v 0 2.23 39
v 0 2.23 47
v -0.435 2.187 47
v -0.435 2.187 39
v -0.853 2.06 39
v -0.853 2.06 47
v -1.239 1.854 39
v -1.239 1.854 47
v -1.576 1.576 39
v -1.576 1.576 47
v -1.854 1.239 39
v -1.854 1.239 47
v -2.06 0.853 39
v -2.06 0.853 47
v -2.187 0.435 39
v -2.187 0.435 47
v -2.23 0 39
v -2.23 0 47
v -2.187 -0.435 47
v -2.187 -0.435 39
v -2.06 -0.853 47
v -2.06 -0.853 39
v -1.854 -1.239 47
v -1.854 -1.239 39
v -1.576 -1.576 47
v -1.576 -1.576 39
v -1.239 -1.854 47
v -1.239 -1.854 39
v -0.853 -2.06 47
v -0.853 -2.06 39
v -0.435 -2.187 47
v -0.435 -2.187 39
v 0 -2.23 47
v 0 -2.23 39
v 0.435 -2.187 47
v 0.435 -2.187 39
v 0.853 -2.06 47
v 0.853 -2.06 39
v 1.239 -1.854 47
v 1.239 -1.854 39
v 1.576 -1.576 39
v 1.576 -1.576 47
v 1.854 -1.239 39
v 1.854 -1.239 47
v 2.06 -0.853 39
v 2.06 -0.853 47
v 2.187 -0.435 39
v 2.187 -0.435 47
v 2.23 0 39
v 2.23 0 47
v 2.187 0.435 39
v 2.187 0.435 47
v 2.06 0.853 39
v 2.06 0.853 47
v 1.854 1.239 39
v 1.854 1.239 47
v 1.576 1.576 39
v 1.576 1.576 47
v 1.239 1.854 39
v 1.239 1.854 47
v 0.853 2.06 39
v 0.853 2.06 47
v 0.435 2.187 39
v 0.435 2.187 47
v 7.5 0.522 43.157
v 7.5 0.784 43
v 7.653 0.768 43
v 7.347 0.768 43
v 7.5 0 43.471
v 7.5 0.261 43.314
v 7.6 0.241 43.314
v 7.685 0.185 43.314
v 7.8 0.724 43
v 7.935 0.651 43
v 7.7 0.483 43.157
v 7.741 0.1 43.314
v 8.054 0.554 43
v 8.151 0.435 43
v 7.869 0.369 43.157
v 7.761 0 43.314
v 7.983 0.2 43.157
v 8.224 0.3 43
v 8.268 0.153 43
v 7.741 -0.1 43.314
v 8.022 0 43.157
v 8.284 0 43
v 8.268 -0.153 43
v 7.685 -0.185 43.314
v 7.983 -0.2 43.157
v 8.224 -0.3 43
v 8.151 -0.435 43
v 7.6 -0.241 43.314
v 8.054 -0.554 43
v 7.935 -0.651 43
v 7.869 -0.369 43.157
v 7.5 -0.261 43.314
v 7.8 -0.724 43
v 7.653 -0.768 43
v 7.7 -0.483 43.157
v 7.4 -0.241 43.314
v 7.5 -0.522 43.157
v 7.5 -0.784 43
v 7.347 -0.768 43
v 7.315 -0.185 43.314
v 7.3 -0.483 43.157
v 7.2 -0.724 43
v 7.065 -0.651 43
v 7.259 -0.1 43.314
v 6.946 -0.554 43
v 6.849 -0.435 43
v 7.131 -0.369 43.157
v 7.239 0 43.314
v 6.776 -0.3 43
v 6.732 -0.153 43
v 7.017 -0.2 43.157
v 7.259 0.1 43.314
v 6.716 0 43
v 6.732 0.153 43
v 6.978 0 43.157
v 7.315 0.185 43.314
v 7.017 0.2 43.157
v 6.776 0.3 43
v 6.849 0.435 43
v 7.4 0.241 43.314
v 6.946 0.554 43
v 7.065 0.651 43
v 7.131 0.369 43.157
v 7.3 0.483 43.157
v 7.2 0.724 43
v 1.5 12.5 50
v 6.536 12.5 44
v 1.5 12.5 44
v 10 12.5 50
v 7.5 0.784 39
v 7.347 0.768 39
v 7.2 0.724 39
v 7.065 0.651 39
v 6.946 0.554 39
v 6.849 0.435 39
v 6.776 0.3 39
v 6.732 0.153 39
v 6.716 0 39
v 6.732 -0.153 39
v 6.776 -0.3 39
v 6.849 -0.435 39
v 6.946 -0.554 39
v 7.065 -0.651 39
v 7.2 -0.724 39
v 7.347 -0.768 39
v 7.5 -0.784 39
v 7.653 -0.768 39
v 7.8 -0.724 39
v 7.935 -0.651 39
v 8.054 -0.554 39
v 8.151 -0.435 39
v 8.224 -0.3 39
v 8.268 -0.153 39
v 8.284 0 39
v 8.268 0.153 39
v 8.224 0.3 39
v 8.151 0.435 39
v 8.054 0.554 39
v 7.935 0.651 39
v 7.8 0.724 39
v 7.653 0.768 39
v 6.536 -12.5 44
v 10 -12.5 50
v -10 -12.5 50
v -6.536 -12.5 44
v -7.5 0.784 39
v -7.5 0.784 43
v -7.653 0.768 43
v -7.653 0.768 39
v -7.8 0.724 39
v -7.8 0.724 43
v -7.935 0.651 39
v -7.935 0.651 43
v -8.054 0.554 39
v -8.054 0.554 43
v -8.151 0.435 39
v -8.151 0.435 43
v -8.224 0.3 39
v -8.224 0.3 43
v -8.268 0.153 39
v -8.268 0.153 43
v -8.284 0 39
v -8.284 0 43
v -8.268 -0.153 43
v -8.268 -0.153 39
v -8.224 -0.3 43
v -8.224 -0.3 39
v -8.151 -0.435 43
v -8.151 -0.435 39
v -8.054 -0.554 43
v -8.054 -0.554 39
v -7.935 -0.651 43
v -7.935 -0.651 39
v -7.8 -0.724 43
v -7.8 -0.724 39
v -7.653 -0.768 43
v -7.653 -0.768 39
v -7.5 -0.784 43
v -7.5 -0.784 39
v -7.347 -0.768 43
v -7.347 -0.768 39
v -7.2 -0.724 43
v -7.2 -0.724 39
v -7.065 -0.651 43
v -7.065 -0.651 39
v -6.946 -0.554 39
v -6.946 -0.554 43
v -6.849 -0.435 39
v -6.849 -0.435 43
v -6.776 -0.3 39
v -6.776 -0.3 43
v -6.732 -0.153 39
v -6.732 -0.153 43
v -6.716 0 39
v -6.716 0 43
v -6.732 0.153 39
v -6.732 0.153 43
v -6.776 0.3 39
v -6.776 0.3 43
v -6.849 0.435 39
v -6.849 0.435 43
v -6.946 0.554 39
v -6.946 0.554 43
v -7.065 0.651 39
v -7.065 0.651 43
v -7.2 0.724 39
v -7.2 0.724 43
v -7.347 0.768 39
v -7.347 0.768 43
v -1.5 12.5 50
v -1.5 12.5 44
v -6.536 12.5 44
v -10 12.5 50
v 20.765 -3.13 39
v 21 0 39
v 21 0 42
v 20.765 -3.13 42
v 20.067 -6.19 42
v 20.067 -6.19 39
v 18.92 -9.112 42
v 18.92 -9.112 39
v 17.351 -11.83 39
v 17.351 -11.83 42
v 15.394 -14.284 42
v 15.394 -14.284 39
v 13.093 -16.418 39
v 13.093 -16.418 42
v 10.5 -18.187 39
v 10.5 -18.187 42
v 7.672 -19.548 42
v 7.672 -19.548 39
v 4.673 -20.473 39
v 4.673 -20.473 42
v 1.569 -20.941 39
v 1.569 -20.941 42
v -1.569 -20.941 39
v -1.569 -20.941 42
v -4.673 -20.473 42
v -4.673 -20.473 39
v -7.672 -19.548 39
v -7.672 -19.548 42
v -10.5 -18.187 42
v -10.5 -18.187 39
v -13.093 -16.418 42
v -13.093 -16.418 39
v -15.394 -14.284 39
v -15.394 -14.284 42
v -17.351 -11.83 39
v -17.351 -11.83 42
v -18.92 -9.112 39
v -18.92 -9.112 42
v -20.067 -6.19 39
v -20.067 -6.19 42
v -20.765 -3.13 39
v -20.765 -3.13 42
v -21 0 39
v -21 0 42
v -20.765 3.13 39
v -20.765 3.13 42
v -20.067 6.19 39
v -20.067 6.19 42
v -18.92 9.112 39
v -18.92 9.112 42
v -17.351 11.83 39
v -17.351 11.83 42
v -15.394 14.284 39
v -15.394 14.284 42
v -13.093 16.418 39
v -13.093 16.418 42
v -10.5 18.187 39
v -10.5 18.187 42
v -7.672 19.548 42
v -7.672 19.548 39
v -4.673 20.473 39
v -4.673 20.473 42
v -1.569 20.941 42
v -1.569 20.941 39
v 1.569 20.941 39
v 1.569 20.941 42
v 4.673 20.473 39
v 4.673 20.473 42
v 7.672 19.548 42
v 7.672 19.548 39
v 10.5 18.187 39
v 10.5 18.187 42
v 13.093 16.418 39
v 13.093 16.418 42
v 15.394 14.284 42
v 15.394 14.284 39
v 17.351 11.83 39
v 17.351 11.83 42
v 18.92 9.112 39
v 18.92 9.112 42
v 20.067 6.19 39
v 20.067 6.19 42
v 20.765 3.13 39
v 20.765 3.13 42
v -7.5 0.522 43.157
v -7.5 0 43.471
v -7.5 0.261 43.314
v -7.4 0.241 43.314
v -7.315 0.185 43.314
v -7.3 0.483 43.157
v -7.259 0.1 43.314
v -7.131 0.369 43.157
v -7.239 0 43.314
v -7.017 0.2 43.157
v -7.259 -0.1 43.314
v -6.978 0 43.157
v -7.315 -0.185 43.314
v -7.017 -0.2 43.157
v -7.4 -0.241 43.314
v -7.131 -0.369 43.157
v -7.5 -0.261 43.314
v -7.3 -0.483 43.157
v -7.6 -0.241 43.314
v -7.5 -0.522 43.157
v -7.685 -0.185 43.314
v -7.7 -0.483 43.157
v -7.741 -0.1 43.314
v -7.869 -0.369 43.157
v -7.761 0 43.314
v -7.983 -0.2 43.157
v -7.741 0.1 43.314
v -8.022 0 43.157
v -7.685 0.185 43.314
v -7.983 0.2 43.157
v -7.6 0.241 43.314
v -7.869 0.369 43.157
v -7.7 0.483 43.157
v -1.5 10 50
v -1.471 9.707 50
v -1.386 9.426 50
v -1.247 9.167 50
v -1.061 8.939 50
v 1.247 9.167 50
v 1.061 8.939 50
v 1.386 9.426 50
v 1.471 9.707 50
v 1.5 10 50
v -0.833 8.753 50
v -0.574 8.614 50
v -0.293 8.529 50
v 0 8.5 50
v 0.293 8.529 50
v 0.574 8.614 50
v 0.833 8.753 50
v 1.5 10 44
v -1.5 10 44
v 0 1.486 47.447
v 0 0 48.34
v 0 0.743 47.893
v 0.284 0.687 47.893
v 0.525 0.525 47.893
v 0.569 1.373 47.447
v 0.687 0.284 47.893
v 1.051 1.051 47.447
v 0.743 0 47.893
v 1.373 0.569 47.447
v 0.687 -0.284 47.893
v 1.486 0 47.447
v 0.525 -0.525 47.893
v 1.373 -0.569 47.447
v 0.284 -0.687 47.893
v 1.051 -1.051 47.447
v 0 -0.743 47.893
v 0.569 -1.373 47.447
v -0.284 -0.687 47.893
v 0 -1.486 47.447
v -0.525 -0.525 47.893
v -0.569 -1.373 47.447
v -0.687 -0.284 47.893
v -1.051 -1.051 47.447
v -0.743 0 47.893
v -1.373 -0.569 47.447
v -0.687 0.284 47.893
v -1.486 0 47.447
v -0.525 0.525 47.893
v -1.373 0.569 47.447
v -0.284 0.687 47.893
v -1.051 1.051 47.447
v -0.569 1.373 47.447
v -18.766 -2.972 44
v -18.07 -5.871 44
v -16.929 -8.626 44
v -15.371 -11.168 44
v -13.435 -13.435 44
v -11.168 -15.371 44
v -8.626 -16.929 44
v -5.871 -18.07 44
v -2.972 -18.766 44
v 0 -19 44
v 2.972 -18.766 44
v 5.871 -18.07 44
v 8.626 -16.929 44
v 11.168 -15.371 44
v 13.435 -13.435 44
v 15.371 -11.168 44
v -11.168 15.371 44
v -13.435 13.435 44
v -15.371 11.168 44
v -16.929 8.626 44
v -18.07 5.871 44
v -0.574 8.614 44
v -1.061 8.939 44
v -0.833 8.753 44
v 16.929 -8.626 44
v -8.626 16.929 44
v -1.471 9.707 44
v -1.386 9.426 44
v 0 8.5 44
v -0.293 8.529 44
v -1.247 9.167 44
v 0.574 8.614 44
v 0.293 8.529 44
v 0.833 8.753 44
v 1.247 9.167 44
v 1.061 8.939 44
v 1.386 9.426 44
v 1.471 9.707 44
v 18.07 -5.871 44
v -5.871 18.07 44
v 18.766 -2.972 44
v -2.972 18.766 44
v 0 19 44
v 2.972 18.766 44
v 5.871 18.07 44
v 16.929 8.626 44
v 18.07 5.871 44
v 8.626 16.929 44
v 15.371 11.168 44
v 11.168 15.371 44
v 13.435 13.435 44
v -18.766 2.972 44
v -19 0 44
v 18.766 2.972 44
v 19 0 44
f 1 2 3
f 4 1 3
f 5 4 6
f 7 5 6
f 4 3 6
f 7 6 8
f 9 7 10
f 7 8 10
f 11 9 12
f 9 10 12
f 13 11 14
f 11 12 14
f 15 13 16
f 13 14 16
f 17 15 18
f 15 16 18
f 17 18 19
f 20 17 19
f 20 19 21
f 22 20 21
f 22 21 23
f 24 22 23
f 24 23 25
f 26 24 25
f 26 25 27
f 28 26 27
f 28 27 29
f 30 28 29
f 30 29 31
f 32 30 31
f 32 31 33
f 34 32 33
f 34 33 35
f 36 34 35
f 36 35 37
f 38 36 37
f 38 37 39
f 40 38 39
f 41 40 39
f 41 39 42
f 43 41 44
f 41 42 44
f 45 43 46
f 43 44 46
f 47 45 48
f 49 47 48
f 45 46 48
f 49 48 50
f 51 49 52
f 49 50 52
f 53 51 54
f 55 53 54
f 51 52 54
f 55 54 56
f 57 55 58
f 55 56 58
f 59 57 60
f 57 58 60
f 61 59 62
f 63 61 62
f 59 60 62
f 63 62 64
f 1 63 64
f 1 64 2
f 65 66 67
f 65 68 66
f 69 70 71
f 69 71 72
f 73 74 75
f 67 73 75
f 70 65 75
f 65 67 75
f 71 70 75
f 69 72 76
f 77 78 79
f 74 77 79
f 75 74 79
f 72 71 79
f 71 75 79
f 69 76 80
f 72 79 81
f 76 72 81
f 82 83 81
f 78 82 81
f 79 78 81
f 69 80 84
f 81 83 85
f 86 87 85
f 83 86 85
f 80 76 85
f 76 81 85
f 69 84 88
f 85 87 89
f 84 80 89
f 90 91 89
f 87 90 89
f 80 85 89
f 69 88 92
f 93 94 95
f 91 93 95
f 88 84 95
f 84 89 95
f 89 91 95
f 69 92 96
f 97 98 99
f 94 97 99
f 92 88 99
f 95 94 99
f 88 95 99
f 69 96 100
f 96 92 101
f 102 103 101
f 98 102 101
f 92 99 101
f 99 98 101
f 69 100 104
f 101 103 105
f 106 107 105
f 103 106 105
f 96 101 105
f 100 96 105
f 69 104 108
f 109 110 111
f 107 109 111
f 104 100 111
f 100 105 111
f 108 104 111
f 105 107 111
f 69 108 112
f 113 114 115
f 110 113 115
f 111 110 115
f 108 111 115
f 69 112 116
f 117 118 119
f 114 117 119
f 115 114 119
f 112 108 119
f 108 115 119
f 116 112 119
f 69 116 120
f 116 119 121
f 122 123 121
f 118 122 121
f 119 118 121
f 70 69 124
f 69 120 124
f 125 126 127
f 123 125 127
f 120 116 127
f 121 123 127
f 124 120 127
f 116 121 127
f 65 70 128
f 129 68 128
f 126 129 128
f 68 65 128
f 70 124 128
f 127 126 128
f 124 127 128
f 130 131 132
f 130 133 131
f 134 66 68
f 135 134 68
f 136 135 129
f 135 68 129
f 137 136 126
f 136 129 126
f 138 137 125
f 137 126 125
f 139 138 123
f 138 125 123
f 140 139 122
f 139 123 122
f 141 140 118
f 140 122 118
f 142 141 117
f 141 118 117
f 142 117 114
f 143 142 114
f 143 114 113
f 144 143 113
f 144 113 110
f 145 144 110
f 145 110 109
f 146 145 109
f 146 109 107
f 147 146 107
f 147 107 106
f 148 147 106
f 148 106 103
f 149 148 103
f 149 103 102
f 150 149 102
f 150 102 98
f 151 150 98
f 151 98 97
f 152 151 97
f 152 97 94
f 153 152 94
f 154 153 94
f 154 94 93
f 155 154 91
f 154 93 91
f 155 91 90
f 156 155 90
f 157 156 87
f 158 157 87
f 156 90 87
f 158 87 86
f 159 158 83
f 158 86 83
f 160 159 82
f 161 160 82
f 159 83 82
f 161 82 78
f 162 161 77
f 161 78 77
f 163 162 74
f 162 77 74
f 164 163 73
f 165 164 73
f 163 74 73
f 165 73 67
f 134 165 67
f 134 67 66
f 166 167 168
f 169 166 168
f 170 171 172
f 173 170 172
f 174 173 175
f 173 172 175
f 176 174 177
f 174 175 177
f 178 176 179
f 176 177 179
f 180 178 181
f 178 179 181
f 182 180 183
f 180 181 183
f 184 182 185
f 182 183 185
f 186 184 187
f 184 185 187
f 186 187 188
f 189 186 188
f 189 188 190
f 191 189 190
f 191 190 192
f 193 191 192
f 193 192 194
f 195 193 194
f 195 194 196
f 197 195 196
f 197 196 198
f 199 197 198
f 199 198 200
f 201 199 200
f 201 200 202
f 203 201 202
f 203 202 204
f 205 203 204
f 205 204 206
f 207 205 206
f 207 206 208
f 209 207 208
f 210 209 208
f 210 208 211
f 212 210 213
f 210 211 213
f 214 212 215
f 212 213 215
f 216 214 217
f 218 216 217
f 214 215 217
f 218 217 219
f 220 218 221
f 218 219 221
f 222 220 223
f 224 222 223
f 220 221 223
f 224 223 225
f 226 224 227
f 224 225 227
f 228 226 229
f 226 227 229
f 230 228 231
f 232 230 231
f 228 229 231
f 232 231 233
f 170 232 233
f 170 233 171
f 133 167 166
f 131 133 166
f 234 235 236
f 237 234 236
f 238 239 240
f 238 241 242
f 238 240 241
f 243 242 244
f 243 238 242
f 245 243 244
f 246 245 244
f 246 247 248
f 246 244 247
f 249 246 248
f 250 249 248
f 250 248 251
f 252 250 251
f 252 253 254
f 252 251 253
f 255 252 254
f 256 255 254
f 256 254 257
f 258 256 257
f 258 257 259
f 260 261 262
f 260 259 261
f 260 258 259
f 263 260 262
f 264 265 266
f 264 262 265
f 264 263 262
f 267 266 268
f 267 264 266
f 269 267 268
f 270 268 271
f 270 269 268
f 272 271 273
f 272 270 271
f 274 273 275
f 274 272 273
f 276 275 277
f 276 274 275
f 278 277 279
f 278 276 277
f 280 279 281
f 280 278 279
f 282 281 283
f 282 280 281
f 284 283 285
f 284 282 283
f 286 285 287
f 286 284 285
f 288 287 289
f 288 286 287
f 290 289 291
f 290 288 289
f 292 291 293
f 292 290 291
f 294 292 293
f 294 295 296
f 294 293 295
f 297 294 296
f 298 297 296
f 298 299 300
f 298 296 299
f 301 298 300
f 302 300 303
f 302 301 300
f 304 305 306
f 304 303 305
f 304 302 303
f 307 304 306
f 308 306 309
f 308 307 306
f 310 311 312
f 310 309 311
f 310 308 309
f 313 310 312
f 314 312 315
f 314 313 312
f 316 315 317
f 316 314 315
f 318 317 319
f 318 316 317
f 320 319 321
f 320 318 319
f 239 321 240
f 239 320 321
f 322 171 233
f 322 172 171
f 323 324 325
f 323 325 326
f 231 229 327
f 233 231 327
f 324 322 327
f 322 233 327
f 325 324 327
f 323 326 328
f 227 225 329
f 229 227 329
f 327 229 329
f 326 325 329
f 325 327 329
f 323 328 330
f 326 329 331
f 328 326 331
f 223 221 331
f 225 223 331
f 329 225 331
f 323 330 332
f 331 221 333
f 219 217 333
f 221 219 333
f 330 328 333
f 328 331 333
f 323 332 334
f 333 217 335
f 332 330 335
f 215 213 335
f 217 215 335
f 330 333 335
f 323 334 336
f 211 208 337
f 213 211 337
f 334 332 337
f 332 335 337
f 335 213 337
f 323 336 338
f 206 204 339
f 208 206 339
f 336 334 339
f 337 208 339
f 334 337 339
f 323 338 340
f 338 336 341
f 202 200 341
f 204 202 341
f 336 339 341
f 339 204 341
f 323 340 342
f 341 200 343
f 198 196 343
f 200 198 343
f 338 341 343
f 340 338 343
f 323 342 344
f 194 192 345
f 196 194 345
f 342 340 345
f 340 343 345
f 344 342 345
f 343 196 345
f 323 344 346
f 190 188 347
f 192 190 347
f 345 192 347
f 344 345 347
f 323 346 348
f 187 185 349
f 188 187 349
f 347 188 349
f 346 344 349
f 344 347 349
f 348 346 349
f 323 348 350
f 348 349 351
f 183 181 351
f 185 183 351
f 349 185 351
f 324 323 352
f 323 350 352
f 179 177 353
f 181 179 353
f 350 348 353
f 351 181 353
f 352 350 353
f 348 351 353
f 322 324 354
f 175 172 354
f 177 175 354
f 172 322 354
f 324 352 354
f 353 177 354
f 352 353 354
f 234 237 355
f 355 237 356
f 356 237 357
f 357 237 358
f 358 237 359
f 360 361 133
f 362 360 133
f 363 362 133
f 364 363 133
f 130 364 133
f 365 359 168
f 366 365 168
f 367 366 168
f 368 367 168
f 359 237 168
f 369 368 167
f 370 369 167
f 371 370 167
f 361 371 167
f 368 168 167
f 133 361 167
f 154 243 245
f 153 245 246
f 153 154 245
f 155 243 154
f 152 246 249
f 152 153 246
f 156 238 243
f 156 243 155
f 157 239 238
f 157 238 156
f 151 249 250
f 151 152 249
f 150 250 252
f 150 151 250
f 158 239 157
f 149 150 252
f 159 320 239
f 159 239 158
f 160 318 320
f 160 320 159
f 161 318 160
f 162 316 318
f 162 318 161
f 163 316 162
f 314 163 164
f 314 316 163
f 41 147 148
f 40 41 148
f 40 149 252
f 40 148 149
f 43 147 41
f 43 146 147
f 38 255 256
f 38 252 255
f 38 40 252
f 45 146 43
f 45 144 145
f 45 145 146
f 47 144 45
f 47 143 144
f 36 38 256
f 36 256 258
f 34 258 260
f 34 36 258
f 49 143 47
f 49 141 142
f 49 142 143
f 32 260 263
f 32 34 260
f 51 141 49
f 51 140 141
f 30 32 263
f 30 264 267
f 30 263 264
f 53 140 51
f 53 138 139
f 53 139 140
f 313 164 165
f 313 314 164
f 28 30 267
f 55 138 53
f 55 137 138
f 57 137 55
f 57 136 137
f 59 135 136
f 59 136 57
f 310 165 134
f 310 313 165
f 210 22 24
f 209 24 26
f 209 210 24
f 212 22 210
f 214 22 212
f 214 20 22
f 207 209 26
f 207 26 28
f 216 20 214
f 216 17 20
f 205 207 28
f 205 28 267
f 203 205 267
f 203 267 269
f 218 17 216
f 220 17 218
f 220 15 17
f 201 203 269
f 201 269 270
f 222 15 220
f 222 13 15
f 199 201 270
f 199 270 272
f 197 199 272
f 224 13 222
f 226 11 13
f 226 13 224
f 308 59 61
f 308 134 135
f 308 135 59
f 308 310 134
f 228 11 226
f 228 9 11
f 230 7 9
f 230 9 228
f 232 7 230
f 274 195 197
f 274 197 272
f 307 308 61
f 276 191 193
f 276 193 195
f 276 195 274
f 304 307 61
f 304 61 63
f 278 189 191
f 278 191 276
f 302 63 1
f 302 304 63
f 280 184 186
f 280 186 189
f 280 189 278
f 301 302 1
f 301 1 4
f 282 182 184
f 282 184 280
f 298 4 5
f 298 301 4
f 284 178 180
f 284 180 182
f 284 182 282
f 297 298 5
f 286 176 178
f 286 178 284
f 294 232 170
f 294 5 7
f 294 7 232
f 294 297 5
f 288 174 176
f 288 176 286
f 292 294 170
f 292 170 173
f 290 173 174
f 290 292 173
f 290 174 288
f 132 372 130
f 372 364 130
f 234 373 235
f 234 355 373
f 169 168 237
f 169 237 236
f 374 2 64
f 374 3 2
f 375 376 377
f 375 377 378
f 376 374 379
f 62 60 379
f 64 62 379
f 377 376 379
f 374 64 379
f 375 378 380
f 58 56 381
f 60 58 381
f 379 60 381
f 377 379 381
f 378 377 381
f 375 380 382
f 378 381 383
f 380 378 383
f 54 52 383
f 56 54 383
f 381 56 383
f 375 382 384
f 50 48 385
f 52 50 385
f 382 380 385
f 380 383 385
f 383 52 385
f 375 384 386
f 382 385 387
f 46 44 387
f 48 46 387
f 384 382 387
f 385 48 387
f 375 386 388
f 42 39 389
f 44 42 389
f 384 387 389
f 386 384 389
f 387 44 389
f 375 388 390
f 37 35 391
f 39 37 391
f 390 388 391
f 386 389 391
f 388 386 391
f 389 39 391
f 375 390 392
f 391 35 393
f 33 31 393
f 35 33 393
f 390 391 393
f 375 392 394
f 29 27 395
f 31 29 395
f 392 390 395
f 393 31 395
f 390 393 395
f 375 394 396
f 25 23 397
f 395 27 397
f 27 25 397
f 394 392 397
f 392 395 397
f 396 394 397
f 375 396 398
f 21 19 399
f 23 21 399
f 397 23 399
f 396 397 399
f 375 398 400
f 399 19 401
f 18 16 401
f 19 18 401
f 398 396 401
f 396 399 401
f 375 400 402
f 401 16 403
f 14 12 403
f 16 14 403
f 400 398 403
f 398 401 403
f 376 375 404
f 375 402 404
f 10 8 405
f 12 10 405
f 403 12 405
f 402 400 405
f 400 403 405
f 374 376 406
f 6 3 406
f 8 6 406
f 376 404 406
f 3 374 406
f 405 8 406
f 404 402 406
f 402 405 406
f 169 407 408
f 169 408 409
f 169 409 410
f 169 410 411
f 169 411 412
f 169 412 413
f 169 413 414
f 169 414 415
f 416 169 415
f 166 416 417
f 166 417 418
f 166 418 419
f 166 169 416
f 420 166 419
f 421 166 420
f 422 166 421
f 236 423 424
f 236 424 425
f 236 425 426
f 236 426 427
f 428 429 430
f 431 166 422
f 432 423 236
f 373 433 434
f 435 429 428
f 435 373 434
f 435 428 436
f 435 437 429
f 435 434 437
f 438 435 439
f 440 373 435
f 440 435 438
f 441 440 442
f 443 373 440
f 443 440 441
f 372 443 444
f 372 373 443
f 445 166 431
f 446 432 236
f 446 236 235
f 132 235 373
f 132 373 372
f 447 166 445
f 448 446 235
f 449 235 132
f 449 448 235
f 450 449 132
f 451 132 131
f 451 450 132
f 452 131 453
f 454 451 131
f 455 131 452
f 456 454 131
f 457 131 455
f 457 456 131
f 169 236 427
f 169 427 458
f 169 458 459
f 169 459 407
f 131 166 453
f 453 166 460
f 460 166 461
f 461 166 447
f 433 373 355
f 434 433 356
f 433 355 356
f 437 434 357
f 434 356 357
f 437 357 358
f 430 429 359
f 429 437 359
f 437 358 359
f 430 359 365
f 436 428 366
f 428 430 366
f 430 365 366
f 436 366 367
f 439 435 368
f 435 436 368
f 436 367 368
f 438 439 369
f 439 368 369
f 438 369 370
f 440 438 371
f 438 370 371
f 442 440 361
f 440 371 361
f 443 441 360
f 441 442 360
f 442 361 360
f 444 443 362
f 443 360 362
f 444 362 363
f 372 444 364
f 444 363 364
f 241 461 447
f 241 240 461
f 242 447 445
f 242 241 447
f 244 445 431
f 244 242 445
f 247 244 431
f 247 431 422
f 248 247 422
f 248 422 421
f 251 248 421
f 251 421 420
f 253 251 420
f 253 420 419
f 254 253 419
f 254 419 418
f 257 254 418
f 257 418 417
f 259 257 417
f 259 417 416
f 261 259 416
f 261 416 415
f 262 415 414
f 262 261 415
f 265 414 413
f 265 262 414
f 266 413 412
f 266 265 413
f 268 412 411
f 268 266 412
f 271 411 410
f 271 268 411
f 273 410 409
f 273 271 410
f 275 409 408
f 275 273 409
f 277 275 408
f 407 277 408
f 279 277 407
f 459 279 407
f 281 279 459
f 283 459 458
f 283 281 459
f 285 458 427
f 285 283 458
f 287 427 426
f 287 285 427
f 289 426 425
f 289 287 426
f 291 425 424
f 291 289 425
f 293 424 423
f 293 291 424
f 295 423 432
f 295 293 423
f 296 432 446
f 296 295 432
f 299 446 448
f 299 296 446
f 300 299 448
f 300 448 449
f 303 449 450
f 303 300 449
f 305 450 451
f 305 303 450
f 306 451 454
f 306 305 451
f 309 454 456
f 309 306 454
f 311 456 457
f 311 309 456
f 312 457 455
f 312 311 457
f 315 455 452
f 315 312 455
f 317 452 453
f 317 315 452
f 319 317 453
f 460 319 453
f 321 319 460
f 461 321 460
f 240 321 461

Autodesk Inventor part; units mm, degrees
ref_plane "YZ Plane" through (0, 0, 0) normal (1, 0, 0) x (0, 1, 0)
ref_plane "XY Plane" through (0, 0, 0) normal (0, 0, 1) x (1, 0, 0)
sketch "Skizze1" plane through (0, 0, 0) normal (0, 0, 1) x (1, 0, 0)
  line L0 (-29.4, 0) -> (29.4, 0) projected
  line L1 (0, -29.4) -> (0, 29.4) projected
  circle A0 centre (0, 0) radius 21
  circle A1 centre (0, 0) radius 19.5
  dimension "d0" = 42
  dimension "d1" = 39
extrude "Extrusion1" add sketch "Skizze1" along normal blind 40 contours A1 L1 A0 L0 | L0 A0 L1 A1 | A1 L0 A0 L1 | L1 A0 L0 A1
sketch "Skizze2" plane through (0, 0, 40) normal (0, 0, 1) x (1, 0, 0)
  circle A0 centre (0, 0) radius 19.5 projected
extrude "Extrusion2" add sketch "Skizze2" against normal blind 1
sketch "Skizze3" plane through (0, 0, 40) normal (0, 0, 1) x (1, 0, 0)
  circle A0 centre (0, 0) radius 21 projected
extrude "Extrusion3" add sketch "Skizze3" along normal blind 4
sketch "Skizze4" plane through (0, 0, 0) normal (0, 1, 0) x (-1, 0, 0)
  line L0 (21, 44) -> (-21, 44) projected
  line L1 (10, 50) -> (-10, 50)
  line L2 (0, -9.2) -> (0, 55.2) projected
  line L3 (29.4, 0) -> (-29.4, 0) projected
  line L4 (-10, 50) -> (-6.5359, 44)
  line L5 (10, 50) -> (6.5359, 44)
  line L6 (-6.5359, 44) -> (6.5359, 44)
  point P0 (0, 0)
  dimension "d8" = 20
  dimension "d9" = 6
  dimension "d10" = 60
extrude "Extrusion4" add sketch "Skizze4" along normal mid plane 25
ref_plane "Arbeitsebene1" through (0, 21, 0) normal (0, 1, 0) x (-1, 0, 0)
sketch "Skizze5" plane through (0, 21, 0) normal (0, 1, 0) x (-1, 0, 0)
  line L0 (29.4, 0) -> (-29.4, 0) projected
  line L1 (0, -10) -> (0, 60) projected
  point P0 (0, 0)
  point P1 (0, 2)
  dimension "d16" = 2
hole "Bohrung1" at (0, 21, 2) direction (0, -1, 0) diameter 2.4 end through all
pattern_circular "Runde Anordnung1" count 4 over 360 about axis through (0, 0, 0) along (0, 0, 1) of "Bohrung1"
sketch "Skizze6" plane through (-10, 12.5, 50) normal (0, 0, 1) x (1, 0, 0)
  line L0 (0, 0) -> (20, 0) projected
  line L1 (-19.4018, -12.5) -> (39.4018, -12.5) projected
  line L2 (10, -41.9018) -> (10, 16.9018) projected
  circle A0 centre (10, -2.5) radius 1.5
  line L3 (8.5, -2.5) -> (8.5, 0)
  line L4 (11.5, -2.5) -> (11.5, 0)
  line L5 (11.5, 0) -> (8.5, 0)
  point P0 (10, -12.5)
  dimension "d27" = 10
  dimension "d28" = 3
extrude "Extrusion5" cut sketch "Skizze6" against normal up to surface (6 mm away)
chamfer "Fase2" distance 2 angle 45 1 edges at (-21, 0, 44)
sketch "Skizze8" plane through (0, 0, 0) normal (0, 0, -1) x (-1, 0, 0)
  circle A0 centre (0, 0) radius 19.5 projected
  circle A1 centre (0, 0) radius 21 projected
extrude "Extrusion6" cut sketch "Skizze8" against normal up to surface (39 mm away)
sketch "Skizze9" plane through (0, 0, 39) normal (0, 0, -1) x (-1, 0, 0)
  circle A0 centre (0, 0) radius 21 projected
hole "Bohrung2" at (0, 0, 39) direction (0, 0, 1) diameter 4.459 depth 8 tip angle 118 thread size "M5x0.5" class "6H" standard "ISO Metric profile"
sketch "Skizze11" plane through (0, 0, 39) normal (0, 0, -1) x (-1, 0, 0)
  circle A0 centre (0, 0) radius 21 projected
  circle A1 centre (0, 0) radius 7.5
  line L0 (29.4, 0) -> (-29.4, 0) projected
  line L1 (0, -29.4) -> (0, 29.4) projected
  point P0 (-7.5, 0)
  point P1 (7.5, 0)
  dimension "d44" = 15
hole "Bohrung3" at (7.5, 0, 39) at (-7.5, 0, 39) direction (0, 0, 1) diameter 1.567 depth 4 tip angle 118 thread size "M2x0.4" class "6H" standard "ISO Metric profile"
properties part number "13_1087_061"
